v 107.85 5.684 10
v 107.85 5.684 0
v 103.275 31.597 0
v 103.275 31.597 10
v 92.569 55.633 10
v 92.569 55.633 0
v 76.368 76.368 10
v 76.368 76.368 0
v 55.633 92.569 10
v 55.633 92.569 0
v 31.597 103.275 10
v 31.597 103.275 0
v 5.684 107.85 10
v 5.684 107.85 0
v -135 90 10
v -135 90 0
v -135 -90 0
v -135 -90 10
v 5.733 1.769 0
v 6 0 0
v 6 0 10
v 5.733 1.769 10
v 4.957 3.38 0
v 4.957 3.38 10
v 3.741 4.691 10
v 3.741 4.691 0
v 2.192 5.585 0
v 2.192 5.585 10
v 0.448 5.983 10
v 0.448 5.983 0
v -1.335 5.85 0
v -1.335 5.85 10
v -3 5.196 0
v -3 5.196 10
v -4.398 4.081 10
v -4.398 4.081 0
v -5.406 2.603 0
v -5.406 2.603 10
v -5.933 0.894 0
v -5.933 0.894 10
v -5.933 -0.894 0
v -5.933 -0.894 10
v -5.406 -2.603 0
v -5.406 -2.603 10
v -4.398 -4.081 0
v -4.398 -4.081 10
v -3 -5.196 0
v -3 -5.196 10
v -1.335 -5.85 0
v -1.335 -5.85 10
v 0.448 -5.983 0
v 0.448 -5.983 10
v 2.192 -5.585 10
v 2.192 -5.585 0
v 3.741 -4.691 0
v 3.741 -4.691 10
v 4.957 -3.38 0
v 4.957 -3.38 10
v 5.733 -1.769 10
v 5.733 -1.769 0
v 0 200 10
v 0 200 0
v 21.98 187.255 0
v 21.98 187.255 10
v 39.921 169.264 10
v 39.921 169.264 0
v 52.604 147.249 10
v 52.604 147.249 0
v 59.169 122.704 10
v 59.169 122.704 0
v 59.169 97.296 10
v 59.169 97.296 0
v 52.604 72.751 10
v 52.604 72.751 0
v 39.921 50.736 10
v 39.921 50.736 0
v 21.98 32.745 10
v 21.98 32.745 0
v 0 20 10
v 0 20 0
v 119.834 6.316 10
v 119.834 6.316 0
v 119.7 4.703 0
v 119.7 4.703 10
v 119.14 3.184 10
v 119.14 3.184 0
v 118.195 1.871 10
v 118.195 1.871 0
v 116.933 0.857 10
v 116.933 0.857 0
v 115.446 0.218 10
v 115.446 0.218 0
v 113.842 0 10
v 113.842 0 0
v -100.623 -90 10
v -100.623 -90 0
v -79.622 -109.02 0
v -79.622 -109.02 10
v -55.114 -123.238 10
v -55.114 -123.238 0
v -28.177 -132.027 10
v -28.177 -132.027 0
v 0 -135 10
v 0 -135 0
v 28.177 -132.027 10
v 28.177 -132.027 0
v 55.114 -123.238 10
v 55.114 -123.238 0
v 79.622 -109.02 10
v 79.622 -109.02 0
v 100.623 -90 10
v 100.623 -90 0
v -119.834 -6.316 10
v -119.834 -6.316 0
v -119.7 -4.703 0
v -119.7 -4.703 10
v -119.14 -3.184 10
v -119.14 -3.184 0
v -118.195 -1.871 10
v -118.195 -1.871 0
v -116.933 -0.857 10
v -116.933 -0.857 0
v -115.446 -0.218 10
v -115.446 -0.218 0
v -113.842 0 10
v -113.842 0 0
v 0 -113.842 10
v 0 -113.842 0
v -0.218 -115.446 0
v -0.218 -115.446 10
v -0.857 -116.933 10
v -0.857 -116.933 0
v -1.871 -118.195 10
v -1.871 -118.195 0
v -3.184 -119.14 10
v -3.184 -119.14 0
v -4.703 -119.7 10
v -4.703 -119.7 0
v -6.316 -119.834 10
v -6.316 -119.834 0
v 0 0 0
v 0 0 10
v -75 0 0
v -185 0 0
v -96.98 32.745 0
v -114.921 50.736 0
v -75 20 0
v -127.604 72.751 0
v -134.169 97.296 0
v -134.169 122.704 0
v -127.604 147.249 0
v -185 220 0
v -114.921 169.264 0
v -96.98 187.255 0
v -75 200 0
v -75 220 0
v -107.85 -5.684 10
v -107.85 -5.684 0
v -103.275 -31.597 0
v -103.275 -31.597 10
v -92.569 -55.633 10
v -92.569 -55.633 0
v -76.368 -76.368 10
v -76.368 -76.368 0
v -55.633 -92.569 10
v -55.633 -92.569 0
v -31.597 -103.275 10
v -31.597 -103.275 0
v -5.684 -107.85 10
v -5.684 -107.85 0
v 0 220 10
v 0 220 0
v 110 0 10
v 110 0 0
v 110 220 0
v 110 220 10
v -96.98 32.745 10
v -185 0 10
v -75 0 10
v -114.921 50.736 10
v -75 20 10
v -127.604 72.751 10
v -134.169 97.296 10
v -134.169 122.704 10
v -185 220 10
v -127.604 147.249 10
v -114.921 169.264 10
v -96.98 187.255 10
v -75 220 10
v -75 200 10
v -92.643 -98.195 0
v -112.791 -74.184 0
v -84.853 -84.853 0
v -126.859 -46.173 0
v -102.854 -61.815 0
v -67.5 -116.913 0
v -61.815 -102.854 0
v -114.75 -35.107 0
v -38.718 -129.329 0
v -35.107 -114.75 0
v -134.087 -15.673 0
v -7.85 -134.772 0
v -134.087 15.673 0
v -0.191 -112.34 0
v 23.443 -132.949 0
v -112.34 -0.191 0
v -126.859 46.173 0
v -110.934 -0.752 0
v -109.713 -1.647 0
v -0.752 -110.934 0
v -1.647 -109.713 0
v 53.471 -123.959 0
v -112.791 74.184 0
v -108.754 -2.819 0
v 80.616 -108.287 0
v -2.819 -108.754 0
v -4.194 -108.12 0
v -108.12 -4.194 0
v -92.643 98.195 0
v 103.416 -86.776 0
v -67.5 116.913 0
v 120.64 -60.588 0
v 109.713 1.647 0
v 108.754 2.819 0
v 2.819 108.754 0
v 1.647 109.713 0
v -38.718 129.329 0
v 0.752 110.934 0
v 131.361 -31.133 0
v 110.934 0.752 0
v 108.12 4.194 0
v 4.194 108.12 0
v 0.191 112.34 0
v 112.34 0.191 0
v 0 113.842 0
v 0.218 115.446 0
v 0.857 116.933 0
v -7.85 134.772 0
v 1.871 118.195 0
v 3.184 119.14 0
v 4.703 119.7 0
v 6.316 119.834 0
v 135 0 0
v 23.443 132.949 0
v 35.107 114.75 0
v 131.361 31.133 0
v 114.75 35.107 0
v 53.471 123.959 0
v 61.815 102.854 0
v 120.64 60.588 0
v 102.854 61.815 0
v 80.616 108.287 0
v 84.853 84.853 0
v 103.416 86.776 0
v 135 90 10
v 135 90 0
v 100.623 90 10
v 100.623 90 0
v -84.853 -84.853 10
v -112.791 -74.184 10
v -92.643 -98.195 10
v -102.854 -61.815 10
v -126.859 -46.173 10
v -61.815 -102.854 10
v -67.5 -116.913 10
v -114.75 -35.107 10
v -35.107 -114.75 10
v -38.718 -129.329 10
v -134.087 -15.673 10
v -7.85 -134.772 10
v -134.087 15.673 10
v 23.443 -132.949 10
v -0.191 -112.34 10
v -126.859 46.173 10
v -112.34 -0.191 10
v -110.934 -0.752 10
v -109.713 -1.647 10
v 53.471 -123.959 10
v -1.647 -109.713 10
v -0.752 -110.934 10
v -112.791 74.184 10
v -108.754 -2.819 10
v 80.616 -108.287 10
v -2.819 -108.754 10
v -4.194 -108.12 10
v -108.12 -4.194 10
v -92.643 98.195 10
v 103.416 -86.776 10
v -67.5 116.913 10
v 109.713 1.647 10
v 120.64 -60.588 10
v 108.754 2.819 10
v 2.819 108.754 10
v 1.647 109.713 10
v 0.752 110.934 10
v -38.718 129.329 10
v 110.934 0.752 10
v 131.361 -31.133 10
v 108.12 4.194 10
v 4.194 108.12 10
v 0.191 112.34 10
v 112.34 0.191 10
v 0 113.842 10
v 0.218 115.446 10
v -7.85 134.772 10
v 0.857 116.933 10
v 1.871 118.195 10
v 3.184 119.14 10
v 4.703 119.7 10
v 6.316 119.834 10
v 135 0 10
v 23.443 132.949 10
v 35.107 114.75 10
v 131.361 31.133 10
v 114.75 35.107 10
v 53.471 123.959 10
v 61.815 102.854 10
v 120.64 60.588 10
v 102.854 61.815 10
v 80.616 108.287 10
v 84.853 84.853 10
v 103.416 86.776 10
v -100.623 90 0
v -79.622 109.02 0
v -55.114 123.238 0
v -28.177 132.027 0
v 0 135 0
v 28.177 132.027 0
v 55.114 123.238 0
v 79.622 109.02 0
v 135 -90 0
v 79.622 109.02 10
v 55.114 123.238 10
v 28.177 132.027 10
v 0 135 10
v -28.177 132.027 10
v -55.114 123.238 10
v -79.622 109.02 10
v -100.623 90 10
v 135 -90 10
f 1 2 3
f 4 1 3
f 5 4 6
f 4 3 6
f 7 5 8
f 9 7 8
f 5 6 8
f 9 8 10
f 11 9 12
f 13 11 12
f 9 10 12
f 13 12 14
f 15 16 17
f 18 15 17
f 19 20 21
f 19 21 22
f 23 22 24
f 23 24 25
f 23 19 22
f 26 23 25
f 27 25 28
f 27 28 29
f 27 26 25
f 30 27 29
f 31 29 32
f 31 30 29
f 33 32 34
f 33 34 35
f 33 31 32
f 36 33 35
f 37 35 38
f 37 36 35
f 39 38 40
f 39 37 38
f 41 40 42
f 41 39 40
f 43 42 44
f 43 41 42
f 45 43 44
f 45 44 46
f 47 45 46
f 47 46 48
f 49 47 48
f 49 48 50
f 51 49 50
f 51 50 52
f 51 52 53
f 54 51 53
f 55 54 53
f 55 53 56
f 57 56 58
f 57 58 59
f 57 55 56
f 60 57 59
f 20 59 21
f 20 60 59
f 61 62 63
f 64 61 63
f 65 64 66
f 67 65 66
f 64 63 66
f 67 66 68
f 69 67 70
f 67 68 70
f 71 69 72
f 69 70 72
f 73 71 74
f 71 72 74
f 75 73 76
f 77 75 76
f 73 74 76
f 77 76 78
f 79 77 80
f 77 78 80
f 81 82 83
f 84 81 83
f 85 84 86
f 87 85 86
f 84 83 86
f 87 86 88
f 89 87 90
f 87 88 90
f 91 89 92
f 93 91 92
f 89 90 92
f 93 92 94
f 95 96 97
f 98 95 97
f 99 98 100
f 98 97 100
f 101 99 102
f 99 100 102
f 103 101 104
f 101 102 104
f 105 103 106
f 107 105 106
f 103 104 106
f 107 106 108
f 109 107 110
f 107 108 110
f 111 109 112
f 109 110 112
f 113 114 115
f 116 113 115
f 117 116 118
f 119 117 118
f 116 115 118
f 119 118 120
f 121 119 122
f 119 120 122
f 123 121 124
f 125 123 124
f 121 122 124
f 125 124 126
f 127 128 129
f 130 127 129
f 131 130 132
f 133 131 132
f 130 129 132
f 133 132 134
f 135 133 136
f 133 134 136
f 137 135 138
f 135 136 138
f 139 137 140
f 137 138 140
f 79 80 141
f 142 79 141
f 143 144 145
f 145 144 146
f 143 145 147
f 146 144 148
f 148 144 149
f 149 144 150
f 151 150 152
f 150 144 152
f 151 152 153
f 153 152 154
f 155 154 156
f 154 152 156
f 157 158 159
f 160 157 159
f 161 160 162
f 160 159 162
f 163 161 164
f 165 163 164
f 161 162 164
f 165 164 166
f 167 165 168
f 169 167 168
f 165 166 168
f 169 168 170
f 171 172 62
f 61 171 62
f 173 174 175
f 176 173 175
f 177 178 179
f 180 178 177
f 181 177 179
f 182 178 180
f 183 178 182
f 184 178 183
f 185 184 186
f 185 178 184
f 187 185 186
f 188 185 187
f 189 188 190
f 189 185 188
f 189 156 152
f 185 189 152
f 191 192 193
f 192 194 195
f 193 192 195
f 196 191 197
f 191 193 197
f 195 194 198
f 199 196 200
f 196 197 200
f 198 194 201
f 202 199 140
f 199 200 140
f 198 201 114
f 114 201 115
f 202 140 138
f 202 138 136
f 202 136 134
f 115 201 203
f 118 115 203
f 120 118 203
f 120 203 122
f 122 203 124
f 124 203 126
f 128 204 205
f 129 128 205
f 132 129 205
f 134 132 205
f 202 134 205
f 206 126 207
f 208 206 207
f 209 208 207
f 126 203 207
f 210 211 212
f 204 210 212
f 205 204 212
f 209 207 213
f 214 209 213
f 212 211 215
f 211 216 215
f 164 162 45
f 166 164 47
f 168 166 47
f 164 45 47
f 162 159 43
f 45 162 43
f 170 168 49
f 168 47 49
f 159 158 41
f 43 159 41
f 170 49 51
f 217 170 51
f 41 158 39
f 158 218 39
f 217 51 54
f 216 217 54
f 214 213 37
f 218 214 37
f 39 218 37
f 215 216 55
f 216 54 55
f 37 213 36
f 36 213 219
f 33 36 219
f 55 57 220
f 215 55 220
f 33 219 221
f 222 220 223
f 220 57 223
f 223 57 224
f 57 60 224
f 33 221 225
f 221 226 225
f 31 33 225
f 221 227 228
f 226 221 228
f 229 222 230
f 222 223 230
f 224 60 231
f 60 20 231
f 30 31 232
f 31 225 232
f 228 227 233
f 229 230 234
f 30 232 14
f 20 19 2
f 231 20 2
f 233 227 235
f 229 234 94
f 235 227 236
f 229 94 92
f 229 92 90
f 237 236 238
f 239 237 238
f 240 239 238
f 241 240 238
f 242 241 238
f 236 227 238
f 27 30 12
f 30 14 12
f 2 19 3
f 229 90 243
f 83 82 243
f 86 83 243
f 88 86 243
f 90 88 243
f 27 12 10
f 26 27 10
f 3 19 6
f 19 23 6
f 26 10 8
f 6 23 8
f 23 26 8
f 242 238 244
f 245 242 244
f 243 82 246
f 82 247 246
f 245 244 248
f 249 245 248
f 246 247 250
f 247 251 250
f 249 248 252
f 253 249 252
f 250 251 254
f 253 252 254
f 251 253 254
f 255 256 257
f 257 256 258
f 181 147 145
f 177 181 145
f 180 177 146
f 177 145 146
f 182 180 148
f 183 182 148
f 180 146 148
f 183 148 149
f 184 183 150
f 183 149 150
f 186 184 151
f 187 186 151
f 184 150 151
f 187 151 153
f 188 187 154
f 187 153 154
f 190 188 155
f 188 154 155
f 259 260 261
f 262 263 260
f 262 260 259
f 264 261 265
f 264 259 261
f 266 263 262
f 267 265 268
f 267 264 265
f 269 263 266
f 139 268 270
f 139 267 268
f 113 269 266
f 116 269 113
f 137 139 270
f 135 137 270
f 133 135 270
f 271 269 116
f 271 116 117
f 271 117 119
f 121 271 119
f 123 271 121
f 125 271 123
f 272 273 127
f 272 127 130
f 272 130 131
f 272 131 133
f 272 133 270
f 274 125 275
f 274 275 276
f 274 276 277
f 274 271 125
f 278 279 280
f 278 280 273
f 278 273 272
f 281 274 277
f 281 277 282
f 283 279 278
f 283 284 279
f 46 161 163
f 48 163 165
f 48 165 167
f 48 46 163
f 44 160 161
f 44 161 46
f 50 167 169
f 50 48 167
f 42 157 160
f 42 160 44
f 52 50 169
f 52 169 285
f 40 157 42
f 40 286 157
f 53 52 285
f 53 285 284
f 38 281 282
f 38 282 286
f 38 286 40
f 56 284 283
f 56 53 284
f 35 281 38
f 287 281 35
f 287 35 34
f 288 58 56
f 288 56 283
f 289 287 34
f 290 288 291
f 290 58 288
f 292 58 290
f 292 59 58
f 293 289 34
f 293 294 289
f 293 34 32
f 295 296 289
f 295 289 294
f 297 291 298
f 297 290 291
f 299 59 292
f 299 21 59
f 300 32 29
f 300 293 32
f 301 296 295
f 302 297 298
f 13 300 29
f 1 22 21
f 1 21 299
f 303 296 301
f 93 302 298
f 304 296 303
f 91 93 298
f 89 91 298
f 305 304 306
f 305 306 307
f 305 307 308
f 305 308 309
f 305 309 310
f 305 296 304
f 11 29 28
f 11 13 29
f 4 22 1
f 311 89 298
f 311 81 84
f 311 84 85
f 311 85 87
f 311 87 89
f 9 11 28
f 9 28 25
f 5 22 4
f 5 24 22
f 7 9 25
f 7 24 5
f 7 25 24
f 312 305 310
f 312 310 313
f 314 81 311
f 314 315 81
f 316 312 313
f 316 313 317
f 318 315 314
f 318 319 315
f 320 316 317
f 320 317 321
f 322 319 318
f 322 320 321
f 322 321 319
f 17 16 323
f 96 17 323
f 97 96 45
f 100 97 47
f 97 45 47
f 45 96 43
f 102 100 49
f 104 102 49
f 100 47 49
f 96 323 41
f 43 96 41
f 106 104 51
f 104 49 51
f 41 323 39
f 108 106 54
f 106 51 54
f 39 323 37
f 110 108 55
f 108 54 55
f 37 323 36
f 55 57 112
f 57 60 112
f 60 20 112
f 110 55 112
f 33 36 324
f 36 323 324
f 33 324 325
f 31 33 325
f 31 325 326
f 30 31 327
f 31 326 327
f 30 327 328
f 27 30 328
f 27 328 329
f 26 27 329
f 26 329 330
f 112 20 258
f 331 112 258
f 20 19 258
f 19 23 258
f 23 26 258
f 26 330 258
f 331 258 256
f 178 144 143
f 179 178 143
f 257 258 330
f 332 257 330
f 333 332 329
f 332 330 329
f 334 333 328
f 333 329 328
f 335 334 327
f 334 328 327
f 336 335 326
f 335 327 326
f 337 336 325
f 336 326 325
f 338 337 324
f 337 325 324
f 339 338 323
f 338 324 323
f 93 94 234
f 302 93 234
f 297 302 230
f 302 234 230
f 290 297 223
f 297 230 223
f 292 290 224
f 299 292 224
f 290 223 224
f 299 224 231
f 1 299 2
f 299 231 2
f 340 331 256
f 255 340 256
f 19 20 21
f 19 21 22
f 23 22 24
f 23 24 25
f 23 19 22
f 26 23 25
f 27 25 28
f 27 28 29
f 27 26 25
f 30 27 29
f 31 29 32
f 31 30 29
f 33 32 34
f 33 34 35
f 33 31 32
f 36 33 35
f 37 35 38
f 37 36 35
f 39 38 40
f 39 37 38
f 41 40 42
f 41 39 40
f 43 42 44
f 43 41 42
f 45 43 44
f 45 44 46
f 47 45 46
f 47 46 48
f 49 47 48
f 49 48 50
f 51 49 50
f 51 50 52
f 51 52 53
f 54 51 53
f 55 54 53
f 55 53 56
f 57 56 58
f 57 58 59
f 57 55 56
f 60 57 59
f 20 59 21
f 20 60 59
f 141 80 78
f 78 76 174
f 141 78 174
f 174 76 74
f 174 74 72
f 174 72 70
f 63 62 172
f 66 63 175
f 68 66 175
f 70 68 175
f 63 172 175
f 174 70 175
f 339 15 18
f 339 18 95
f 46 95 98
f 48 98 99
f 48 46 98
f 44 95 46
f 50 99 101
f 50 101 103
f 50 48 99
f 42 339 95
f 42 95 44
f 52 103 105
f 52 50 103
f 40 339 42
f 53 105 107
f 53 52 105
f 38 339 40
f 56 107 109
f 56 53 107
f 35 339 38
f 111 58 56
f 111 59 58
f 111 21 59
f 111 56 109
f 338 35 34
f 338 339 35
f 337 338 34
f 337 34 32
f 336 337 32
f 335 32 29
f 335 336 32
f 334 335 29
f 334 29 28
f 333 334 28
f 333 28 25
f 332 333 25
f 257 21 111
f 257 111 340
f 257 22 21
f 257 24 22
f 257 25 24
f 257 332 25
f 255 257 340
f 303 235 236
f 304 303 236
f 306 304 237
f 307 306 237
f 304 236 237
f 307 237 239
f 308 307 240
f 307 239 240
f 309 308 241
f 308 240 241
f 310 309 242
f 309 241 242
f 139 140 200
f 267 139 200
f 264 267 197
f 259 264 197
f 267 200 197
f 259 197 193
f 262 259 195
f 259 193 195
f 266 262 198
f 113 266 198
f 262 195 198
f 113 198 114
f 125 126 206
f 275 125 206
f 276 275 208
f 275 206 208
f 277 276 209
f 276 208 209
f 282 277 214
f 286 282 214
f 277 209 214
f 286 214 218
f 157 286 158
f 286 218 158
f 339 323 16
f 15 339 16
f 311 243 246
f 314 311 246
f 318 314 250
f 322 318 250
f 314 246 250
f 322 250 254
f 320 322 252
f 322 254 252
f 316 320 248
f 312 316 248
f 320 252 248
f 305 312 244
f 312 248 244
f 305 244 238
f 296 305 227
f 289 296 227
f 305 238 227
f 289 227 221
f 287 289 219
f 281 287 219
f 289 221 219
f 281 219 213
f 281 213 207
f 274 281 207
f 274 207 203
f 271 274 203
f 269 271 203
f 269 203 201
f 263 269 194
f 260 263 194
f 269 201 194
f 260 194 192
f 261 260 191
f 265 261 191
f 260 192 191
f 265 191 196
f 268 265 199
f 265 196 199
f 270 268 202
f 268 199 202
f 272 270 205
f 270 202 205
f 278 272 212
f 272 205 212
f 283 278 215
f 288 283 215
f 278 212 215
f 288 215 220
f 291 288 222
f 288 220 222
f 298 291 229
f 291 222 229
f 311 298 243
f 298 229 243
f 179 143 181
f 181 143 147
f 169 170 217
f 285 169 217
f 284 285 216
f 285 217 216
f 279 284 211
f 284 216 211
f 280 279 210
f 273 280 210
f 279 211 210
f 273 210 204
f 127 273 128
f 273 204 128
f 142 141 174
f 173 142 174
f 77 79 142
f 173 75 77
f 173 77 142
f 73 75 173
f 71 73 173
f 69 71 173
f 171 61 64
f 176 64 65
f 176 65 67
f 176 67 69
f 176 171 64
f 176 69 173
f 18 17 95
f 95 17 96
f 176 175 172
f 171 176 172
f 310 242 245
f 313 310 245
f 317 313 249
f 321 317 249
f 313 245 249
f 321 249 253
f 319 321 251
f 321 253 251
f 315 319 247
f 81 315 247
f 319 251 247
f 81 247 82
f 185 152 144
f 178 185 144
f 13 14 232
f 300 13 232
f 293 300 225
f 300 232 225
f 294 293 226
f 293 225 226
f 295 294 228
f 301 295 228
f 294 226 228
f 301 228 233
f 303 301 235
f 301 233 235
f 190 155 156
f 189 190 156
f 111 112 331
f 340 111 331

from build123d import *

# Parameters (mm, degrees)
F1_DEPTH = 10
F2_R     = 135
F2_R_2   = 6
F3_DEPTH = 10
F4_R     = 6
F5_DEPTH = 10


with BuildPart() as f1:
    # F0 (on Top) → F1 (new body)
    with BuildSketch(Plane.XY):
        with BuildLine():
            Line((0, 20), (0, 0))
            Line((0, 0), (110, 0))
            Line((110, 0), (110, 220))
            Line((110, 220), (0, 220))
            Line((0, 220), (0, 200))
            ThreePointArc((0, 200), (43.6249036979, 164.083269132), (60, 110))
            ThreePointArc((60, 110), (43.6249036979, 55.916730868), (0, 20))
        make_face()
    extrude(amount=F1_DEPTH)


with BuildPart() as f1b:
    # F0 (on Top) → F1, piece 2 (new body)
    with BuildSketch(Plane.XY):
        with BuildLine():
            Line((-75, 0), (-75, 20))
            ThreePointArc((-75, 20), (-135, 110), (-75, 200))
            Line((-75, 200), (-75, 220))
            Line((-75, 220), (-185, 220))
            Line((-185, 220), (-185, 0))
            Line((-185, 0), (-75, 0))
        make_face()
    extrude(amount=F1_DEPTH)


with BuildPart() as f3:
    # F2 (on Top) → F3 (new body)
    with BuildSketch(Plane.XY):
        Circle(F2_R)
        with BuildLine():
            ThreePointArc((-107.8503117784, -5.6842105263), (-76.3675323681, -76.3675323681), (-5.6842105263, -107.8503117784))
            ThreePointArc((-5.6842105263, -107.8503117784), (-1.6471424993, -109.7125125564), (0, -113.8419957661))
            ThreePointArc((0, -113.8419957661), (-1.8705167903, -118.1948532667), (-6.3157894737, -119.8336797537))
            ThreePointArc((-6.3157894737, -119.8336797537), (-84.8528137424, -84.8528137424), (-119.8336797537, -6.3157894737))
            ThreePointArc((-119.8336797537, -6.3157894737), (-118.1948532667, -1.8705167903), (-113.8419957661, 0))
            ThreePointArc((-113.8419957661, 0), (-109.7125125564, -1.6471424993), (-107.8503117784, -5.6842105263))
        make_face(mode=Mode.SUBTRACT)
        Circle(F2_R_2, mode=Mode.SUBTRACT)
        with BuildLine():
            ThreePointArc((6.3157894737, 119.8336797537), (84.8528137424, 84.8528137424), (119.8336797537, 6.3157894737))
            ThreePointArc((119.8336797537, 6.3157894737), (118.1948532667, 1.8705167903), (113.8419957661, 0))
            ThreePointArc((113.8419957661, 0), (109.7125125564, 1.6471424993), (107.8503117784, 5.6842105263))
            ThreePointArc((107.8503117784, 5.6842105263), (76.3675323681, 76.3675323681), (5.6842105263, 107.8503117784))
            ThreePointArc((5.6842105263, 107.8503117784), (1.6471424993, 109.7125125564), (0, 113.8419957661))
            ThreePointArc((0, 113.8419957661), (1.8705167903, 118.1948532667), (6.3157894737, 119.8336797537))
        make_face(mode=Mode.SUBTRACT)
    extrude(amount=F3_DEPTH)


with BuildPart() as f5:
    # F4 (on Top) → F5 (new body)
    with BuildSketch(Plane.XY):
        with BuildLine():
            ThreePointArc((100.6230589875, -90), (126.11326846, -48.1709821194), (135, 0))
            ThreePointArc((135, 0), (126.11326846, 48.1709821194), (100.6230589875, 90))
            Line((100.6230589875, 90), (-100.6230589875, 90))
            ThreePointArc((-100.6230589875, 90), (-126.113268469, 48.1709820958), (-135, -5.05e-08))
            ThreePointArc((-135, -5.05e-08), (-126.113268451, -48.1709821429), (-100.6230589875, -90))
            Line((-100.6230589875, -90), (100.6230589875, -90))
        make_face()
        Circle(F4_R, mode=Mode.SUBTRACT)
        with BuildLine():
            Line((-100.6230589875, 90), (100.6230589875, 90))
            ThreePointArc((100.6230589875, 90), (0, 135), (-100.6230589875, 90))
        make_face()
        with BuildLine():
            ThreePointArc((100.6230589875, 90), (126.11326846, 48.1709821194), (135, 0))
            Line((135, 0), (135, 90))
            Line((135, 90), (100.6230589875, 90))
        make_face()
        with BuildLine():
            Line((135, -90), (135, 0))
            ThreePointArc((135, 0), (126.11326846, -48.1709821194), (100.6230589875, -90))
            Line((100.6230589875, -90), (135, -90))
        make_face()
        with BuildLine():
            ThreePointArc((-100.6230589875, -90), (0, -135), (100.6230589875, -90))
            Line((100.6230589875, -90), (-100.6230589875, -90))
        make_face()
        with BuildLine():
            Line((-135, -90), (-100.6230589875, -90))
            ThreePointArc((-100.6230589875, -90), (-126.113268451, -48.1709821429), (-135, -5.05e-08))
            Line((-135, -5.05e-08), (-135, -90))
        make_face()
        with BuildLine():
            ThreePointArc((-135, -5.05e-08), (-126.113268469, 48.1709820958), (-100.6230589875, 90))
            Line((-100.6230589875, 90), (-135, 90))
            Line((-135, 90), (-135, -5.05e-08))
        make_face()
    extrude(amount=F5_DEPTH)


solid = Compound([f1.part, f1b.part, f3.part, f5.part])
